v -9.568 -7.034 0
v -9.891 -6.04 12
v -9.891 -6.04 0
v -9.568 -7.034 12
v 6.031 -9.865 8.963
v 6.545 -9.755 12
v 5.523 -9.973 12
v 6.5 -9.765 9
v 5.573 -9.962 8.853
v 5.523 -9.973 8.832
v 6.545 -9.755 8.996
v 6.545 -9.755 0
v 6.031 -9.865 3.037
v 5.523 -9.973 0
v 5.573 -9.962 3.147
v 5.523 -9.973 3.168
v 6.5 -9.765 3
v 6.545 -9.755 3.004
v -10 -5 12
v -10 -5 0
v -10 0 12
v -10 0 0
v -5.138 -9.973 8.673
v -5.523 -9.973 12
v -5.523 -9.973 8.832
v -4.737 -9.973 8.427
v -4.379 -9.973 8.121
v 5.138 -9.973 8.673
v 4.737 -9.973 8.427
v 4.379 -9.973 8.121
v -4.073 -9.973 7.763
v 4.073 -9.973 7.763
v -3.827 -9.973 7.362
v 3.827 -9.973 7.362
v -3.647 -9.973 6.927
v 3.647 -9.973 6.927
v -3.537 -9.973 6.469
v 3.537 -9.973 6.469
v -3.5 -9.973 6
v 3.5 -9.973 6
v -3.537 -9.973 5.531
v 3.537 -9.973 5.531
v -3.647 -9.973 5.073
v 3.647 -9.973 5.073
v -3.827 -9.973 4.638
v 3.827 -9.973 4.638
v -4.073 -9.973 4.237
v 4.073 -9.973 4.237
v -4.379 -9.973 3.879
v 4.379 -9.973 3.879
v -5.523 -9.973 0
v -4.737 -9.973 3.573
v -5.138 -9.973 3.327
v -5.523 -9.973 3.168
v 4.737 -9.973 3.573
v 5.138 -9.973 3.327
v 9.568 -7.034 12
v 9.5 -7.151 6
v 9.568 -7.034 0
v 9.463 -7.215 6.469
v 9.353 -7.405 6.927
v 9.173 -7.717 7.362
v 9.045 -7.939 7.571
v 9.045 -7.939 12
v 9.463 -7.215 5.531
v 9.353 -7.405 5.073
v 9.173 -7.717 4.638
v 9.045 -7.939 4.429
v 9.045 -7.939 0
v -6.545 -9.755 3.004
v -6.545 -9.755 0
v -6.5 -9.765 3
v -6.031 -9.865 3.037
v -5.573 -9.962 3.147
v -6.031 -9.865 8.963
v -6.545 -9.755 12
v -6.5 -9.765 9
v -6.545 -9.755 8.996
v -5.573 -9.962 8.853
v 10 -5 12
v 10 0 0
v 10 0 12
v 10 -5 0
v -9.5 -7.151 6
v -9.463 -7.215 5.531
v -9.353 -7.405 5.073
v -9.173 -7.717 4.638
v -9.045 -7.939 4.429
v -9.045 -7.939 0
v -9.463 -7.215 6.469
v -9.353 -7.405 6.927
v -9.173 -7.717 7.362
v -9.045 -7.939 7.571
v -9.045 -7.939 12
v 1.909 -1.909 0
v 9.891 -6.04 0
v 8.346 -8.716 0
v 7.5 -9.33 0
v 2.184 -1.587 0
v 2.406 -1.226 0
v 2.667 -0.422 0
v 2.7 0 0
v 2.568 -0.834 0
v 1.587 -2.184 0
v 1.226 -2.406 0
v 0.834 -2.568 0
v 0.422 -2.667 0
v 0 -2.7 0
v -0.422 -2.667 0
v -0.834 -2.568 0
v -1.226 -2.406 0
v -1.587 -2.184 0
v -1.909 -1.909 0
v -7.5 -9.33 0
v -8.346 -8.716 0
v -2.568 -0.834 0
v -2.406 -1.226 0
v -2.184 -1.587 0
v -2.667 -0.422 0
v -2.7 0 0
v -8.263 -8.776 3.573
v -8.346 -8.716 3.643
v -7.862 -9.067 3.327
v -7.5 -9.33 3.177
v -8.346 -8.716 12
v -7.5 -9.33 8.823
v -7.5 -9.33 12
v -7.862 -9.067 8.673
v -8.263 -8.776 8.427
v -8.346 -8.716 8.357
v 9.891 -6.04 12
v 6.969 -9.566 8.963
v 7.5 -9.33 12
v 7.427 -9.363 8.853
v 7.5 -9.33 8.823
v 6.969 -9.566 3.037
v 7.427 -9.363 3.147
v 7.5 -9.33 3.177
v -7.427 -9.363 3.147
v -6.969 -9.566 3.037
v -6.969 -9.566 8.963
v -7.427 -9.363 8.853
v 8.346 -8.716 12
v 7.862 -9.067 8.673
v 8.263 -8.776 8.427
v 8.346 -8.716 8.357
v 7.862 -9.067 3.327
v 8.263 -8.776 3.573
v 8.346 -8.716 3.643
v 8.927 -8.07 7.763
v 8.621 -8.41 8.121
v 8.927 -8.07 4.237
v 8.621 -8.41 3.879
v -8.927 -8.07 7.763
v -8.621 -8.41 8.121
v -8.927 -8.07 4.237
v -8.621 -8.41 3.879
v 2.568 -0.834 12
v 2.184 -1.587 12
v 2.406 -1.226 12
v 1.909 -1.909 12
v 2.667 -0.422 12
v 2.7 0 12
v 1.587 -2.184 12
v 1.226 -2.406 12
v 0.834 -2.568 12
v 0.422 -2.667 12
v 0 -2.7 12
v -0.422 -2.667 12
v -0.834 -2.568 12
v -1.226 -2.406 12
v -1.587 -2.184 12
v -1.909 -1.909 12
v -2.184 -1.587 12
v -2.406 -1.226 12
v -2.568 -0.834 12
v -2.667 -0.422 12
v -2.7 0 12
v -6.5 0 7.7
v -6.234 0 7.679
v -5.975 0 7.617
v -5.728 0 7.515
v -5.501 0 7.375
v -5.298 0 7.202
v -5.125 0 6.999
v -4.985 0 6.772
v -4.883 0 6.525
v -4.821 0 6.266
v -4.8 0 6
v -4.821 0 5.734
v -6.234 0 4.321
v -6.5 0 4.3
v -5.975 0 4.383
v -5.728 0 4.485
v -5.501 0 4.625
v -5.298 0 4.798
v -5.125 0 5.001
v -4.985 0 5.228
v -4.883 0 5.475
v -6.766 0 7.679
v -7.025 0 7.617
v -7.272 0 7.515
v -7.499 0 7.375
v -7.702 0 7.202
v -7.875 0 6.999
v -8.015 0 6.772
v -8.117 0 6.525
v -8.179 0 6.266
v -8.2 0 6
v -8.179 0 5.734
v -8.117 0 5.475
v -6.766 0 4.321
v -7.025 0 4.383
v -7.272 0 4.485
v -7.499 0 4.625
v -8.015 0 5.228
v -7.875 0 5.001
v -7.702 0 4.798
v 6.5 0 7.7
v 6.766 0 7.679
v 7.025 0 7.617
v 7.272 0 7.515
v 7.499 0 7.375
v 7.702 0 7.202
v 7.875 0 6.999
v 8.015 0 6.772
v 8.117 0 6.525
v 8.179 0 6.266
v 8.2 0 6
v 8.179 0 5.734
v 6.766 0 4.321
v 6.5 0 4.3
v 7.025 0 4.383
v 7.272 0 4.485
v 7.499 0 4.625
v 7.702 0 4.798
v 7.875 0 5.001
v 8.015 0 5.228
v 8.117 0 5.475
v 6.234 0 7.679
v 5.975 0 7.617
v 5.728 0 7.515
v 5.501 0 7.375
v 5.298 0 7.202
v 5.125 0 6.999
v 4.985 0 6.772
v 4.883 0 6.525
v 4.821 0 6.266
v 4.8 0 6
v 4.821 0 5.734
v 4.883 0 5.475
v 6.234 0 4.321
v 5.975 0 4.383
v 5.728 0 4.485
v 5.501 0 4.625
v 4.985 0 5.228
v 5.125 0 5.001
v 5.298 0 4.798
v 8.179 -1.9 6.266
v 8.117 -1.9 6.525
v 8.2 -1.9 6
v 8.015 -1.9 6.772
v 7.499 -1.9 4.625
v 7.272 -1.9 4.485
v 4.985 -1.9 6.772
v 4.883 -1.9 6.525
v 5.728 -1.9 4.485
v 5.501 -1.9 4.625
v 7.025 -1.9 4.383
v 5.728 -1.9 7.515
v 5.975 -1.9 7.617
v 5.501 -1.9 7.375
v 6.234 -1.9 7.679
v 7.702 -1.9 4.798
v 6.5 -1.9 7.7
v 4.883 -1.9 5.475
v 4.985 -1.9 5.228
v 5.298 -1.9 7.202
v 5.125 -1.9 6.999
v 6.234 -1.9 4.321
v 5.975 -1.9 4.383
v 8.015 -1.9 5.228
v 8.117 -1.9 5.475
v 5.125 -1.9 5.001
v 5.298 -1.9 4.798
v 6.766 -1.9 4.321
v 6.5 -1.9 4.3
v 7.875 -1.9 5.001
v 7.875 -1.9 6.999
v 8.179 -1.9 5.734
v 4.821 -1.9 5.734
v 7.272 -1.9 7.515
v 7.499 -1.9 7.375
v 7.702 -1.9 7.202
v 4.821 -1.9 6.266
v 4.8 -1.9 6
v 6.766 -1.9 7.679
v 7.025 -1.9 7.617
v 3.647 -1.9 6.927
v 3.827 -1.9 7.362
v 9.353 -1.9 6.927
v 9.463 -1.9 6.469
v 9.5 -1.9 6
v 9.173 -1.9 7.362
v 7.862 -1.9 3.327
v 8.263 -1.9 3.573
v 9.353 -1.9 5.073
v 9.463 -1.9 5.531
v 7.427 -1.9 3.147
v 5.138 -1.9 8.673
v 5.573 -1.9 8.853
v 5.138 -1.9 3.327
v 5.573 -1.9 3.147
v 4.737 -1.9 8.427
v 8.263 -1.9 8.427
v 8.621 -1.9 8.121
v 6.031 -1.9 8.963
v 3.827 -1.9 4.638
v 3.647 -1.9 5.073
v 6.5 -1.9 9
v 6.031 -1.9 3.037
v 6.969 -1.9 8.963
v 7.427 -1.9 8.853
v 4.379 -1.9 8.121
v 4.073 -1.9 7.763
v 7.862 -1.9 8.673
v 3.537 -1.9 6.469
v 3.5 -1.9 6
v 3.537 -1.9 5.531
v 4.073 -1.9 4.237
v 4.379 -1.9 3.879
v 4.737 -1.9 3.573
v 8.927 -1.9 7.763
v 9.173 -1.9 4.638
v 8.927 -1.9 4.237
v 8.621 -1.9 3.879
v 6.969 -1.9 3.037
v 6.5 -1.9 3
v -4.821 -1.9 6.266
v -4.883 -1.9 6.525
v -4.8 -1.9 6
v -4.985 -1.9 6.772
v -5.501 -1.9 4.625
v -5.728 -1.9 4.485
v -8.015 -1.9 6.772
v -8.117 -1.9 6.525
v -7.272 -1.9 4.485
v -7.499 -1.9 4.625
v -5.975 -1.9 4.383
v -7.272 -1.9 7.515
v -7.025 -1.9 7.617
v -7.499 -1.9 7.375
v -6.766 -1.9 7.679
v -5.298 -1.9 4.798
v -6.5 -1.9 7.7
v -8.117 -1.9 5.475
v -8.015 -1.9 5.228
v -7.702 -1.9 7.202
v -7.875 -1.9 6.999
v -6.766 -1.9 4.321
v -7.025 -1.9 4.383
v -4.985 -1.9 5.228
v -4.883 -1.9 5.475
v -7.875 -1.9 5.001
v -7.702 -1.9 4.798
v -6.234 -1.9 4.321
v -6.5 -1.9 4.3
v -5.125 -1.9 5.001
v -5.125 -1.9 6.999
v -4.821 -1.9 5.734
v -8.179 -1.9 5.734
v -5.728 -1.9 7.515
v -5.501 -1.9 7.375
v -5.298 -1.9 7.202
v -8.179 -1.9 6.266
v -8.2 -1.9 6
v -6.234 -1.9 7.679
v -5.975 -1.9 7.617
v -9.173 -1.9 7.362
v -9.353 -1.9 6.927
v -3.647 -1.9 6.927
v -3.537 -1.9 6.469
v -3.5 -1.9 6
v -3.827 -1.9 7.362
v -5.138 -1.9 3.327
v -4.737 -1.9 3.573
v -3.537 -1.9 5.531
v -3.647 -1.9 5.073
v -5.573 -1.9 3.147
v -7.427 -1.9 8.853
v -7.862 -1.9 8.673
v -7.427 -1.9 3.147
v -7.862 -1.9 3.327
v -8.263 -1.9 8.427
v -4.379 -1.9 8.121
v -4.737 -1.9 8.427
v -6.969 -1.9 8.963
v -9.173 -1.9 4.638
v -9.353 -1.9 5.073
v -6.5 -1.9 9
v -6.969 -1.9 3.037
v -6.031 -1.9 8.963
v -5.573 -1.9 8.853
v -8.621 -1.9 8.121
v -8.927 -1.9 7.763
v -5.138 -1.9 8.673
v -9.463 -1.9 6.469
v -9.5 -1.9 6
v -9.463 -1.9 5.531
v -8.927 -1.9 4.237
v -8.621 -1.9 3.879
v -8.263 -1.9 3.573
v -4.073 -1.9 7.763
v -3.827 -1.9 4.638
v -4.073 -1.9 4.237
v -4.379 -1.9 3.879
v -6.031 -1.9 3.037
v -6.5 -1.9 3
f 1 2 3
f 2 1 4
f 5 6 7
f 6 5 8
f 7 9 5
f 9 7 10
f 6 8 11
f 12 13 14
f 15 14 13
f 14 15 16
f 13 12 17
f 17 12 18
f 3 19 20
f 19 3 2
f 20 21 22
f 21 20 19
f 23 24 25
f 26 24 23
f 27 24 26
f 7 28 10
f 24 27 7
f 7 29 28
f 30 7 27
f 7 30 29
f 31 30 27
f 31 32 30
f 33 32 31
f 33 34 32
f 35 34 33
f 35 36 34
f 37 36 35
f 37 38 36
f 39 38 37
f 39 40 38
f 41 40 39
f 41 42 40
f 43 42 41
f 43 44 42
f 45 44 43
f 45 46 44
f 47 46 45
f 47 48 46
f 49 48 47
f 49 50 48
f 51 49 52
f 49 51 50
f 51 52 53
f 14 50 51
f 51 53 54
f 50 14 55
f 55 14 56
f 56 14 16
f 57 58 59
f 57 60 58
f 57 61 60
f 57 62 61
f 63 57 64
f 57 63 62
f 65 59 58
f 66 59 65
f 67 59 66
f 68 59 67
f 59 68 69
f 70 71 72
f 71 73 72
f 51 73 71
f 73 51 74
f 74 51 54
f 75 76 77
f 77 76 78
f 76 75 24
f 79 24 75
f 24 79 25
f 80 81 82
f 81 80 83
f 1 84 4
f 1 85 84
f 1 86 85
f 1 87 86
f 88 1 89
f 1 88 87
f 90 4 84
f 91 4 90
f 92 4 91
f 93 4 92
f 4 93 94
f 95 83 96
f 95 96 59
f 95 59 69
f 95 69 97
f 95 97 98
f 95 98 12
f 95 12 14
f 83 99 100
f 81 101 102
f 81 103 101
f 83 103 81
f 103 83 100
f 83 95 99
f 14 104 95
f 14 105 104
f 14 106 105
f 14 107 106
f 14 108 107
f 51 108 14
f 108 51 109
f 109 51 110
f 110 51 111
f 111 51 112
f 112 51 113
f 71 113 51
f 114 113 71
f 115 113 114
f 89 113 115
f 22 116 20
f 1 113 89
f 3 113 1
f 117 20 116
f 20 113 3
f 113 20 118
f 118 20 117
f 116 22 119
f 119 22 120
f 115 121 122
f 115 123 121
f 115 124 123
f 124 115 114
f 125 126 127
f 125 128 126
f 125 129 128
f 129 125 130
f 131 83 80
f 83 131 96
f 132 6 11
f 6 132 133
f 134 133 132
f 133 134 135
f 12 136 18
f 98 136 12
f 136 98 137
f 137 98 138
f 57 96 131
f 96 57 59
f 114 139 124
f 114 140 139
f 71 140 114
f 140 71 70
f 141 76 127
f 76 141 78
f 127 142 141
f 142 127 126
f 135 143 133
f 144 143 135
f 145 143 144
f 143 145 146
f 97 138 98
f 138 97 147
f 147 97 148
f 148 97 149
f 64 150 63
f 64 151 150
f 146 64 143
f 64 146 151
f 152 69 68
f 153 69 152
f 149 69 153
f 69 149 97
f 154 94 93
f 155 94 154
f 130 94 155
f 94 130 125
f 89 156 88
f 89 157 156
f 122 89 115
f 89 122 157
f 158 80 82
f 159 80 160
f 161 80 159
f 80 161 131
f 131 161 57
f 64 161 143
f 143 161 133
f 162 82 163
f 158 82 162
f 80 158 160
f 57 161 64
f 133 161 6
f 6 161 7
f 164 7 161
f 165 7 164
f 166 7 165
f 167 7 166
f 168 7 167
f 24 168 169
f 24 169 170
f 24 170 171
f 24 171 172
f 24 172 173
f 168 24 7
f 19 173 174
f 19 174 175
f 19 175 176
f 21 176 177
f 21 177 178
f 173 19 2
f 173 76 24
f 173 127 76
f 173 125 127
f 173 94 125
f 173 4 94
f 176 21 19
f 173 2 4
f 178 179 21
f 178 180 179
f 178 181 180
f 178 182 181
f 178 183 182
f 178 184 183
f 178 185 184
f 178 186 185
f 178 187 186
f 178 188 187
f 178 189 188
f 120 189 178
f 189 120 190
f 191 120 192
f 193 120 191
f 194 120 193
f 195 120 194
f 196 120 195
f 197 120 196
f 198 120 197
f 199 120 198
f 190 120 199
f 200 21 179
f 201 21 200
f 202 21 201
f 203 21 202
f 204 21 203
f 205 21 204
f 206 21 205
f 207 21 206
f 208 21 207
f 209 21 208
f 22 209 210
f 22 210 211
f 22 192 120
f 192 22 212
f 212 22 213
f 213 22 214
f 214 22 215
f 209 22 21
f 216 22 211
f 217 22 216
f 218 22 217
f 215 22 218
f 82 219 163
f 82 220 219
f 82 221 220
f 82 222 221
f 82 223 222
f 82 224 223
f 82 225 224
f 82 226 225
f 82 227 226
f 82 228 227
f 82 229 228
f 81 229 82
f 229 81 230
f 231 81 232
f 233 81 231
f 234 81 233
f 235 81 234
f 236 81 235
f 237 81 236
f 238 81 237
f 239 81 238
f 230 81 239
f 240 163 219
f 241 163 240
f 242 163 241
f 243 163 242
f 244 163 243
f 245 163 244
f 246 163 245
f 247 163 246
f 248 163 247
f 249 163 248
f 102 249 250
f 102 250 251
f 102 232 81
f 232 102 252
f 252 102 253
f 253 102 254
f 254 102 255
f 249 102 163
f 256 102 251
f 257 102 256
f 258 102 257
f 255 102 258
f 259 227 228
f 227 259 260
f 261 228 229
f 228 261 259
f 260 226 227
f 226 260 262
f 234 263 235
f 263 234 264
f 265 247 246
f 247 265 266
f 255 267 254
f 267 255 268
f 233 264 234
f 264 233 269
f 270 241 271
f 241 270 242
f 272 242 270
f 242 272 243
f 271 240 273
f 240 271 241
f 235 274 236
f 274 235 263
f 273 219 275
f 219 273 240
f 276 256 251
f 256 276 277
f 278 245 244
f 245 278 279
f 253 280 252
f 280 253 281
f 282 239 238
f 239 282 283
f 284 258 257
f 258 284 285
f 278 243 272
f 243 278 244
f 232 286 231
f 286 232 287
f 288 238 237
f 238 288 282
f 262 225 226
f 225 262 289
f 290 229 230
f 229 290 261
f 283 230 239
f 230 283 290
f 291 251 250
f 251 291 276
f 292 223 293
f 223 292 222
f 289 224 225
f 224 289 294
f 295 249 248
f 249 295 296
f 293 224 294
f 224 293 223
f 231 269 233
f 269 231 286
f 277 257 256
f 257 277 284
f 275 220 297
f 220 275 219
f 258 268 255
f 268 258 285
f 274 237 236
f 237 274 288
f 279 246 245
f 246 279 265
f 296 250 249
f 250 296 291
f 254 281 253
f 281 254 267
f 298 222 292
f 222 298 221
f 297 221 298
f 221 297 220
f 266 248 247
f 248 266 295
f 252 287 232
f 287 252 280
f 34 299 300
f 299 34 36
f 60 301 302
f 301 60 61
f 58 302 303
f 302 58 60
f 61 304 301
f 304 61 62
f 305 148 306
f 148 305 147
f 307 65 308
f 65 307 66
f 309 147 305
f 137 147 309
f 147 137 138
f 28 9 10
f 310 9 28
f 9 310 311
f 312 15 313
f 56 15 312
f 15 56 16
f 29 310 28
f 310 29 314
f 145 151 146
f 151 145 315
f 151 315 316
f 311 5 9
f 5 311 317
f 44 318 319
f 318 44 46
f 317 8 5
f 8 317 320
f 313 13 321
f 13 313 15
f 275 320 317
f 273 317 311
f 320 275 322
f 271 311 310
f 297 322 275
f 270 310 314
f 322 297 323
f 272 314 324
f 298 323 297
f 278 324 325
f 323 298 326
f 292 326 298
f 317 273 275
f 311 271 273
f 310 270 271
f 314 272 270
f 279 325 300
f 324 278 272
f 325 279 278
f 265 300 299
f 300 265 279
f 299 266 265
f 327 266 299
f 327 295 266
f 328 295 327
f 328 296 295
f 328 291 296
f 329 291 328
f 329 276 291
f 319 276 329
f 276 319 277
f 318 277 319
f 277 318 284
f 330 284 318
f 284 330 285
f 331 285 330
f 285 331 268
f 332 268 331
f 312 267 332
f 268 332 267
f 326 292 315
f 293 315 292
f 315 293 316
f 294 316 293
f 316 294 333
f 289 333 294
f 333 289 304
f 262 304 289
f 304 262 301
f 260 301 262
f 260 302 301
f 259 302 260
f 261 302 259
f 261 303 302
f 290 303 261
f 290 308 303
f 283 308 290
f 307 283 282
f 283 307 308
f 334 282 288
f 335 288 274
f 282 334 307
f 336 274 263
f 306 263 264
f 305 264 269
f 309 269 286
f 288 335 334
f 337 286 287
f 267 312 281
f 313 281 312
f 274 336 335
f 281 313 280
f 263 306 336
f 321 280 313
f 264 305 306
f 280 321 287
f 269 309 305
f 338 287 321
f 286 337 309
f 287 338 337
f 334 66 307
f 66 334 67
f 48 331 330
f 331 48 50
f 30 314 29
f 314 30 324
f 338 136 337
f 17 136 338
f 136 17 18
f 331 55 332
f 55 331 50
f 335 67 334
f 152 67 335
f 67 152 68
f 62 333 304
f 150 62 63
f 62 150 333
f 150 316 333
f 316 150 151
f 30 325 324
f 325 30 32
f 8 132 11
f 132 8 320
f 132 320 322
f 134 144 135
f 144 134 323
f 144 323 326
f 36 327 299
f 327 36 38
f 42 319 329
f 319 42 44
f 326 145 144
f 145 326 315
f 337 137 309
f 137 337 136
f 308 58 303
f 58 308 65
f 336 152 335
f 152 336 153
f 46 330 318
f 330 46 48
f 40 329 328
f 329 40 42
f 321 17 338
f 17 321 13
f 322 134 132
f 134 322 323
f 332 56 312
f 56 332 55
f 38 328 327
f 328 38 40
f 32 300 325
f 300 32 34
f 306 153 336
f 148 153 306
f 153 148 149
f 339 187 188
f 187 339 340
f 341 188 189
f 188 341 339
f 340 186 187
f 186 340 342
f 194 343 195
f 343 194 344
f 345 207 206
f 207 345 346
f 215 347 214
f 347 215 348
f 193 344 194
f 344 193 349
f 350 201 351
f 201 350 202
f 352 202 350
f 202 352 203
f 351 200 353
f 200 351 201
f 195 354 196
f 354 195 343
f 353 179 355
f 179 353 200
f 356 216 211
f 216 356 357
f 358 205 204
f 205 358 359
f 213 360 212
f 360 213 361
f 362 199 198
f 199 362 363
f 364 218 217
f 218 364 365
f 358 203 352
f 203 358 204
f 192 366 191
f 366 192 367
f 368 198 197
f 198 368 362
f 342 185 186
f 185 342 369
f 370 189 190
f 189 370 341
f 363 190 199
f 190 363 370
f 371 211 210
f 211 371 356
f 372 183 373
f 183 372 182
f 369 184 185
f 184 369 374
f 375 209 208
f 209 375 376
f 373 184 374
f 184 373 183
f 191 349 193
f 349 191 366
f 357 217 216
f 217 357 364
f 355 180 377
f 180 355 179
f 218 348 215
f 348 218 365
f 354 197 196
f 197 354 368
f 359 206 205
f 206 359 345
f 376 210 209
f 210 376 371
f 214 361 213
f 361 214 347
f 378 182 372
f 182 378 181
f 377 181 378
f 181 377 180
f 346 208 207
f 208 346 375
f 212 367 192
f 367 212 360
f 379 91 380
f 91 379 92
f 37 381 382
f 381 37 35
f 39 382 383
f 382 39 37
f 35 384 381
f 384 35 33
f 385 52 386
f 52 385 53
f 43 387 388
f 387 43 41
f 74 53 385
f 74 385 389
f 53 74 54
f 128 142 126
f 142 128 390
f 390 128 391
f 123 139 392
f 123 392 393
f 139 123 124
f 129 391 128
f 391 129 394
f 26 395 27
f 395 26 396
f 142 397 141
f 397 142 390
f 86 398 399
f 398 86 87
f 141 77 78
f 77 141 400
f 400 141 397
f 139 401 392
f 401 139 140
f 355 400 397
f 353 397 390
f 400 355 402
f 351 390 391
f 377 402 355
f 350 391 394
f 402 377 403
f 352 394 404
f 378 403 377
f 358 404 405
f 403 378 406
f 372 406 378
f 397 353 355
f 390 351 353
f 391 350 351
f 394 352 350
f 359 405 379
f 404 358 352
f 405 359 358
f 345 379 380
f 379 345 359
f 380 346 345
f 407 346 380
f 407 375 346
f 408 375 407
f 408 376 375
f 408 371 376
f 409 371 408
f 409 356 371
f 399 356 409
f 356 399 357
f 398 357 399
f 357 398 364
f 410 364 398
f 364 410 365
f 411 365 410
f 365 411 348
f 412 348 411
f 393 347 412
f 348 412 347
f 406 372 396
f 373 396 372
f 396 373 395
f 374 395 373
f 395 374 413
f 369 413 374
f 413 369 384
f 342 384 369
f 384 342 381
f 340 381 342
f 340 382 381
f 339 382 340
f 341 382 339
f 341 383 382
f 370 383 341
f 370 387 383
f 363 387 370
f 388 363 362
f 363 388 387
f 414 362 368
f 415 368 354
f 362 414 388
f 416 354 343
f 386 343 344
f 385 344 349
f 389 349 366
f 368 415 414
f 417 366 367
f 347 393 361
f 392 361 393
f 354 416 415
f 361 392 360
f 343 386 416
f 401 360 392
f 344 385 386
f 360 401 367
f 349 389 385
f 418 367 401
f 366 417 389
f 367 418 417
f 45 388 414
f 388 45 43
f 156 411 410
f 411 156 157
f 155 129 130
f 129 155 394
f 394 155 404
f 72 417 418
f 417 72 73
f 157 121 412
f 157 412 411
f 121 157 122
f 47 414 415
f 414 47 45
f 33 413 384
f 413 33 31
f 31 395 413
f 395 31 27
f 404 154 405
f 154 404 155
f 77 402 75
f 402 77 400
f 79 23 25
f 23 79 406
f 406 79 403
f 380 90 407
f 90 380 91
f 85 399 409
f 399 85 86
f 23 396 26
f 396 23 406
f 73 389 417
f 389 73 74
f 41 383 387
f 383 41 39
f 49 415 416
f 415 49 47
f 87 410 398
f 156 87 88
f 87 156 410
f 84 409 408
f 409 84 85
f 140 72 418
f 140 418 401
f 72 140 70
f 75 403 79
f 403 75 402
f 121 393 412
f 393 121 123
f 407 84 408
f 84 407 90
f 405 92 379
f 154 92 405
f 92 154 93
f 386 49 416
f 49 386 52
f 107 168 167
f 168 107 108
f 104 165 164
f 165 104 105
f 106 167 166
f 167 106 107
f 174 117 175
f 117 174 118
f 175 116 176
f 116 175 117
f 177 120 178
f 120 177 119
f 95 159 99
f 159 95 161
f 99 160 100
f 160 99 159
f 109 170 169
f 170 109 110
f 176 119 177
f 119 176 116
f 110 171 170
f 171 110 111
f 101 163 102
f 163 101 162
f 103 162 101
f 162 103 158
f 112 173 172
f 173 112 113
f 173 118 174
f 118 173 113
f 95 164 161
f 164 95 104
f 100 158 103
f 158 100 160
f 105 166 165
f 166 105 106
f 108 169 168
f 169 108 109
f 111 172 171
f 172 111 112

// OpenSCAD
// file: lib/stepper.scad
smWidth = 42;
smLength = 40;
smScrewHoleOffsets = 31/2;
smCenterDiameter = 22;
smExtra = 1;

module stepperMotor() {
    smCenterHeight = 2;
    smShaftDiameter = 5;
    smShaftLength = 23;
    smScrewDepth = 4.5;
    smScrewDiameter = 3;
    smEdgeTrimOffset = 27;
    module add() {
        translate([-smWidth/2, -smLength, -smWidth/2]) {
            cube([smWidth, smLength, smWidth]);
        }
        rotate([-90, 0, 0]) {
            cylinder(d=smCenterDiameter, h=smCenterHeight, $fn=30);
            cylinder(d=smShaftDiameter, h=smShaftLength, $fn=20);
        }
    }
    module del() {
        for (x = [smScrewHoleOffsets, -smScrewHoleOffsets]) {
            for (z = [smScrewHoleOffsets, -smScrewHoleOffsets]) {
                translate([x, iota, z]) {
                    rotate([90, 0, 0]) {
                        cylinder(d=smScrewDiameter, h=smScrewDepth, $fn=40);
                    }
                }
            }
        }
        for (a = [45, 135, 225, 315]) {
            rotate([0, a, 0]) {
                translate([smEdgeTrimOffset,
                        -smLength-iota, -smWidth/2-iota]) {
                    cube([smWidth, smLength+2*iota, smWidth+2*iota]);
                }
            }
        }

    }
    difference() {
        add();
        del();
    }
}

module stepperMotorHole() {
    smHoleHeight = 20;
    smScrewHoleDiameter = 4;

    widthPlusExtra = smWidth + smExtra;
    lengthPlusExtra = smLength + smExtra/2;

    translate([-smWidth/2, -lengthPlusExtra, -widthPlusExtra/2]) {
        cube([smWidth, lengthPlusExtra, widthPlusExtra]);
    }
    translate([0, -iota, 0]) {
        rotate([-90, 0, 0]) {
            cylinder(d=smCenterDiameter+smExtra, h=smHoleHeight, $fn=40);
        }
    }
    for (x = [smScrewHoleOffsets, -smScrewHoleOffsets]) {
        for (z = [smScrewHoleOffsets, -smScrewHoleOffsets]) {
            translate([x, smHoleHeight-iota, z]) {
                rotate([90, 0, 0]) {
                    cylinder(d=smScrewHoleDiameter, h=smHoleHeight, $fn=40);
                }
            }
        }
    }

}
// file: lib/commonConstants.scad
// A small quantity to keep parts from starting or ending at exactly the
// same location. For example when we create a hole through an object we
// want the object being subtracted to stick slightly past the object being
// subtracted from.
iota = 0.1;


// Length and hole diameter of the #4 x 3/8in Phillips mount screw.
screwLength = 9.3;
screwHoleDiameter = 2.75;
screwHeadDiameter = 6.5;
screwBodyDiameter = 3.4;


// These constants are the basic parameters of the mount plate. They are
// necessary for other components to make their calculations.
mountPlateWidth = 37.6;
mountPlateLength = 51;


// These constants are the basis for the carbon fiber mount points. They are
// necessary for other components to make their calculations.
mountRodDiameter = 5.5;         // A little extra because holes are smaller.
mountThickness = 9;
mountDiameter = mountRodDiameter + 2*mountThickness;


// These constasnts are teh basis for the motor base. They are necessary for
// other components to make their calculations.
motorBaseExtraAxisOffset = 5;
motorBaseTopOffset = sqrt(3)*mountPlateWidth/6 + motorBaseExtraAxisOffset;
motorBaseBottomOffset = mountPlateLength/sqrt(2) + motorBaseTopOffset;
motorBaseBottomRadius = sqrt(pow(motorBaseBottomOffset,2) +
                             pow(mountPlateWidth/2, 2));
mountBaseRodOffsets = motorBaseBottomRadius-mountDiameter/2;
// main file
include <lib/commonConstants.scad>;
include <lib/stepper.scad>;
include <lib/commonMounts.scad>;

screwMountCap();
